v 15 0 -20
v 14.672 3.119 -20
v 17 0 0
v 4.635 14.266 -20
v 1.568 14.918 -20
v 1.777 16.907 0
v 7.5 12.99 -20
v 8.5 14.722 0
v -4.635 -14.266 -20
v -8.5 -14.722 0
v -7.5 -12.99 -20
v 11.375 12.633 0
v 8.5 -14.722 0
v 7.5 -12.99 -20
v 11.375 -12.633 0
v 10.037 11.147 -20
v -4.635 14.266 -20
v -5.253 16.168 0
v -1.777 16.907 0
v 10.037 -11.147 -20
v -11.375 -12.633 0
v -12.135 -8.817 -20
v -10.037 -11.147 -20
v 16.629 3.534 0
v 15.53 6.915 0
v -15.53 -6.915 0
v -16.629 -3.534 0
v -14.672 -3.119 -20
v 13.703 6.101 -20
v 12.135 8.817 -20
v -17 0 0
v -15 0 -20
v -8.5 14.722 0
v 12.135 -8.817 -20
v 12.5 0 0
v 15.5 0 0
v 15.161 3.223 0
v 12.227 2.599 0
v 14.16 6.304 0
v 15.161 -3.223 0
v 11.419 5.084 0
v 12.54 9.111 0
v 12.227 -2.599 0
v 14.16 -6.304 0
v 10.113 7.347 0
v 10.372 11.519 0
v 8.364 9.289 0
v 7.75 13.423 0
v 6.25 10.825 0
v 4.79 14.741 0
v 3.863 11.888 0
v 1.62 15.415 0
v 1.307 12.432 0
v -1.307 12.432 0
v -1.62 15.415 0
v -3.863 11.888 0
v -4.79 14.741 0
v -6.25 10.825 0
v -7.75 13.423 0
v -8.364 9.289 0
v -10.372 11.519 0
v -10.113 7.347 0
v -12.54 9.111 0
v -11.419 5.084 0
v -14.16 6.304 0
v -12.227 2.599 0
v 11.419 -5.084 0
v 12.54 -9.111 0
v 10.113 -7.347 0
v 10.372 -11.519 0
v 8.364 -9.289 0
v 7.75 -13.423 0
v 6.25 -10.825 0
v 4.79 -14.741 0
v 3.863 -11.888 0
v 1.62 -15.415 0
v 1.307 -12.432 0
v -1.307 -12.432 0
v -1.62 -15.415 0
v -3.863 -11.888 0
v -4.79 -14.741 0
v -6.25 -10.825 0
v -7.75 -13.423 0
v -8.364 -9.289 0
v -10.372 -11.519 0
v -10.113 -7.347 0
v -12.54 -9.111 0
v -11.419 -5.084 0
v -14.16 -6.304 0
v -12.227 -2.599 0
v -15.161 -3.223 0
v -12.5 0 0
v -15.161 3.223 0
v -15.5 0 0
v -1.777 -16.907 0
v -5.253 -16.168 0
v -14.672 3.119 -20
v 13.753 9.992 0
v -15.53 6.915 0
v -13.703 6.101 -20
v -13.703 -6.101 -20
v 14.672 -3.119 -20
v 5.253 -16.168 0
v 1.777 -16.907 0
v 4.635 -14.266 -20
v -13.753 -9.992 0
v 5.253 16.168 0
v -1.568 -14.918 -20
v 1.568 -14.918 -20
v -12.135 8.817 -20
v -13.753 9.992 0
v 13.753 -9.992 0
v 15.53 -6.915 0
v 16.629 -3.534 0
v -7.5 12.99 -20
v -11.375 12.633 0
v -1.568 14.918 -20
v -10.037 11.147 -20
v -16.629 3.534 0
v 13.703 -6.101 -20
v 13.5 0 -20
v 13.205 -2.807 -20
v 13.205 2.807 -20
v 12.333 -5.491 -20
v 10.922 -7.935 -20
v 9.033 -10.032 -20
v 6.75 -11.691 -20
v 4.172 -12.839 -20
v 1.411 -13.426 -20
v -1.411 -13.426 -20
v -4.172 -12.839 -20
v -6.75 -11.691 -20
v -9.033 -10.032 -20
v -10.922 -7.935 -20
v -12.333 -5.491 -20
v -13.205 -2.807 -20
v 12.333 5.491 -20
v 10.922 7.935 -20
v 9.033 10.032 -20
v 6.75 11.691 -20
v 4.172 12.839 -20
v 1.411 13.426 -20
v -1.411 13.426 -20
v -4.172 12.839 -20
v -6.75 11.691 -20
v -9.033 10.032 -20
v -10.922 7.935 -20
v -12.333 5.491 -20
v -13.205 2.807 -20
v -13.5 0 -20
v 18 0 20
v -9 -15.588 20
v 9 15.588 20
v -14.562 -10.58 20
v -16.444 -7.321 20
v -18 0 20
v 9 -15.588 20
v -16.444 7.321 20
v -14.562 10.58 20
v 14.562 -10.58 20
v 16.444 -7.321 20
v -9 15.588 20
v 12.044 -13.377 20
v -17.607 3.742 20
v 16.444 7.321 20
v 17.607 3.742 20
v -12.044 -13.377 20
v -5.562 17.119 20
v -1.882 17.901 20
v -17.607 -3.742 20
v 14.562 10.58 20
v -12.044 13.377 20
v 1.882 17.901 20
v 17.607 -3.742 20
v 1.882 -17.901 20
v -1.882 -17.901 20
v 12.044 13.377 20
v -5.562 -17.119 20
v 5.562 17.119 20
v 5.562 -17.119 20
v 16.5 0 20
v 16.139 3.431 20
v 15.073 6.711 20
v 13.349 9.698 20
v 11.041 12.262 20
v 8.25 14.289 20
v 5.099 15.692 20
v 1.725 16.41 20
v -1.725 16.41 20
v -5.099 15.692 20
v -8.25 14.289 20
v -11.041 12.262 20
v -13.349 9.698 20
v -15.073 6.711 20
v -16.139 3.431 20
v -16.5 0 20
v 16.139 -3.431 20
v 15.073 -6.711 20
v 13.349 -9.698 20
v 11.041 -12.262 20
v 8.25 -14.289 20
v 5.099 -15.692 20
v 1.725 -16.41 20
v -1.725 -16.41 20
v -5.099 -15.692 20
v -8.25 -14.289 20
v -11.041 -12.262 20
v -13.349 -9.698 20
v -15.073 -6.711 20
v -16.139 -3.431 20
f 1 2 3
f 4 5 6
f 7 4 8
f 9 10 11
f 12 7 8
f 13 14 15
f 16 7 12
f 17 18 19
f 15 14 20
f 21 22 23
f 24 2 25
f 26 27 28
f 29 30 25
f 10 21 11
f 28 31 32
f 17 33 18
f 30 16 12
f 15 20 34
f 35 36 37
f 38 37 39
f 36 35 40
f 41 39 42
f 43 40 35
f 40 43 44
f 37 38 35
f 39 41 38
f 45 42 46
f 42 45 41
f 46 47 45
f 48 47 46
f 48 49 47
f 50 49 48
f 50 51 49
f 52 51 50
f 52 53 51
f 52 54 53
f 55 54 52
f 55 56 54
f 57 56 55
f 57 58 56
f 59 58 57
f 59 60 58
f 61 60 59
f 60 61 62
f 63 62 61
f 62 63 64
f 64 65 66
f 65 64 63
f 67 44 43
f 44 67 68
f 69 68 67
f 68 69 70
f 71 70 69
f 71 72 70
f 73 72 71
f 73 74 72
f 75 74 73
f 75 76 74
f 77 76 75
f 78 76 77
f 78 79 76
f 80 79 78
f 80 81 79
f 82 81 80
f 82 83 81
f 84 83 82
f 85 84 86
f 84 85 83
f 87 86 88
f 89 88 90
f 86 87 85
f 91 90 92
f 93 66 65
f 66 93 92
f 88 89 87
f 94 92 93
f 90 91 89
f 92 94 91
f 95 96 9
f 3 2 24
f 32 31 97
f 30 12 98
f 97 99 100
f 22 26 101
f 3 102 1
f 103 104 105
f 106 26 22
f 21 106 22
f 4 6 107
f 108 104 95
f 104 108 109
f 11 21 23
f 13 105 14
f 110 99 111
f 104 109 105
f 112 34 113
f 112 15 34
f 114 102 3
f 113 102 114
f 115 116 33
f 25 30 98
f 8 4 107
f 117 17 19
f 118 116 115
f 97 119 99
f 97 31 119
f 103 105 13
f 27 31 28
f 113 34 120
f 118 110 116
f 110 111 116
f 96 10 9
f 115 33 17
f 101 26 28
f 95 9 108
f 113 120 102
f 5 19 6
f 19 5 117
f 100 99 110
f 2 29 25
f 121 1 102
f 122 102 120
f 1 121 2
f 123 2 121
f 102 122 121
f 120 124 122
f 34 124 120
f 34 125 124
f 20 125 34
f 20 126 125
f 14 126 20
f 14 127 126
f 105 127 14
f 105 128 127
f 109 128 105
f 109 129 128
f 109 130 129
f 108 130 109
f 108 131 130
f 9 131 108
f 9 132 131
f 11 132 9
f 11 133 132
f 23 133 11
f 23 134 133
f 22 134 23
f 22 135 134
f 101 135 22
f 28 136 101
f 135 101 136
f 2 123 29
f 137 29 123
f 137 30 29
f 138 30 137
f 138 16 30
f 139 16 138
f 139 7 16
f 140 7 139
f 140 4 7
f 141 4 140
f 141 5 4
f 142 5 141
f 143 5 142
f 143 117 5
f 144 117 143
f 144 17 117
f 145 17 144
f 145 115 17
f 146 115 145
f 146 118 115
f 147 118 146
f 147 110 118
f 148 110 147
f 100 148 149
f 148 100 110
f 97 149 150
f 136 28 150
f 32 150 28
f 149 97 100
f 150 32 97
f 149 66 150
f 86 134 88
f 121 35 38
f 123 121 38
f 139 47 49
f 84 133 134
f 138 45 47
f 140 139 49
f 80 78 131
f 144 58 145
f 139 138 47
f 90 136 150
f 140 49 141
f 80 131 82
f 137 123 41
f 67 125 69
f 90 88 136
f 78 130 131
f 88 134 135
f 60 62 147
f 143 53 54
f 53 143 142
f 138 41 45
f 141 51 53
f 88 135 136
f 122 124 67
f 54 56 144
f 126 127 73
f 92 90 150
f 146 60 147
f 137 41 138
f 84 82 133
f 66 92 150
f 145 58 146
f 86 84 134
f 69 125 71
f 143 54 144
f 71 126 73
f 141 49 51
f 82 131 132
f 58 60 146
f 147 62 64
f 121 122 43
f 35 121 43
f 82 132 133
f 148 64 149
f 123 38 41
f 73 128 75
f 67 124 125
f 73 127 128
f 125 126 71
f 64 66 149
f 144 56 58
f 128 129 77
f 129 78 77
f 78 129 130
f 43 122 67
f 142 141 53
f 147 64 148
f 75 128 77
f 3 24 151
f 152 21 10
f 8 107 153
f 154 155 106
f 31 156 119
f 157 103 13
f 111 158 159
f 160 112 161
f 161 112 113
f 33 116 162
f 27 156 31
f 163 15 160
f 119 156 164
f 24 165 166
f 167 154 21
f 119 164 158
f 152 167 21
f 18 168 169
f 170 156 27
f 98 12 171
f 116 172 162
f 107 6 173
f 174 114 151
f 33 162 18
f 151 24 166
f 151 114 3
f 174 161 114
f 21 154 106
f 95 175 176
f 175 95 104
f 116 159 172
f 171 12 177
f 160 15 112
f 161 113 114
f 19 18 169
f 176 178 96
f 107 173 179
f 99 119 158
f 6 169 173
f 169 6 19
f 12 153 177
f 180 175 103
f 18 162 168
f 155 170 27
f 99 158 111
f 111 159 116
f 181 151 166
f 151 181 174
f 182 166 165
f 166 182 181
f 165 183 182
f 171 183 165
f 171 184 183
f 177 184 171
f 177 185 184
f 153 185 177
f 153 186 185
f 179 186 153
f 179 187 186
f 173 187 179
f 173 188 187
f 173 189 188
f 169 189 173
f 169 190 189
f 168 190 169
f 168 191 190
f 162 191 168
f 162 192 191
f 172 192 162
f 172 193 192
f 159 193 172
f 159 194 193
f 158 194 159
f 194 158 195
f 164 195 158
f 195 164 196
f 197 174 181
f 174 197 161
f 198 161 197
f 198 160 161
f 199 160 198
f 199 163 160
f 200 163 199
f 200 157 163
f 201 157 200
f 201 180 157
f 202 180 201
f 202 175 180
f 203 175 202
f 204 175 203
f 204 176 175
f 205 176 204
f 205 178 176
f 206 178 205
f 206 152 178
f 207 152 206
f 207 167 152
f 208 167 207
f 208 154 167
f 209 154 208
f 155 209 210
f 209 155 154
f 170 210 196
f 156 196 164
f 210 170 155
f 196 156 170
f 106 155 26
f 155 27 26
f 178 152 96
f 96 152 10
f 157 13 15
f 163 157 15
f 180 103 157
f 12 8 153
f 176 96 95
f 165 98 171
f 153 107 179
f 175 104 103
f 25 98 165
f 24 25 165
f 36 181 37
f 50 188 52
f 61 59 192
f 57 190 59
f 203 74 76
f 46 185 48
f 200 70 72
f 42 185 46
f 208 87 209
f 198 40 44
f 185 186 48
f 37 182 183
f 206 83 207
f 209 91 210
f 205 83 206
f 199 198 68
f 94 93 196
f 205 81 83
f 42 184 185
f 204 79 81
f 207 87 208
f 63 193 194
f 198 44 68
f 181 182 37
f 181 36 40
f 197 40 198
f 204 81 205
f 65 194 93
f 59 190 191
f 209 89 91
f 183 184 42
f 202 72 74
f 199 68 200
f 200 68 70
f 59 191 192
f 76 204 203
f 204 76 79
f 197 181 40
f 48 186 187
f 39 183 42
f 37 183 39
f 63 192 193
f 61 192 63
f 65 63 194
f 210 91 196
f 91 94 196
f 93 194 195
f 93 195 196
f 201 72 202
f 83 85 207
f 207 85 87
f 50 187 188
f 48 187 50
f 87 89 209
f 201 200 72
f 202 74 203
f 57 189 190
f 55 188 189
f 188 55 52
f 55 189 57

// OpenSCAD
r_sander = 25/2;
r_vac = 31/2;
taper = 1;
thickness = 1.5;

translate([0,0,-10]) {
    difference() {
        cylinder(h = 20, r1 = r_sander+taper+thickness, r2 = r_vac+thickness, center = true);
        cylinder(h = 20, r1 = r_sander+taper, r2 = r_sander, center = true);
    };
}

translate([0,0,10]) {
    difference() {
        cylinder(h = 20, r1 = r_vac+thickness, r2 = r_vac+taper+thickness, center = true);
        cylinder(h = 20, r1 = r_vac, r2 = r_vac+taper, center = true);
    };
}
